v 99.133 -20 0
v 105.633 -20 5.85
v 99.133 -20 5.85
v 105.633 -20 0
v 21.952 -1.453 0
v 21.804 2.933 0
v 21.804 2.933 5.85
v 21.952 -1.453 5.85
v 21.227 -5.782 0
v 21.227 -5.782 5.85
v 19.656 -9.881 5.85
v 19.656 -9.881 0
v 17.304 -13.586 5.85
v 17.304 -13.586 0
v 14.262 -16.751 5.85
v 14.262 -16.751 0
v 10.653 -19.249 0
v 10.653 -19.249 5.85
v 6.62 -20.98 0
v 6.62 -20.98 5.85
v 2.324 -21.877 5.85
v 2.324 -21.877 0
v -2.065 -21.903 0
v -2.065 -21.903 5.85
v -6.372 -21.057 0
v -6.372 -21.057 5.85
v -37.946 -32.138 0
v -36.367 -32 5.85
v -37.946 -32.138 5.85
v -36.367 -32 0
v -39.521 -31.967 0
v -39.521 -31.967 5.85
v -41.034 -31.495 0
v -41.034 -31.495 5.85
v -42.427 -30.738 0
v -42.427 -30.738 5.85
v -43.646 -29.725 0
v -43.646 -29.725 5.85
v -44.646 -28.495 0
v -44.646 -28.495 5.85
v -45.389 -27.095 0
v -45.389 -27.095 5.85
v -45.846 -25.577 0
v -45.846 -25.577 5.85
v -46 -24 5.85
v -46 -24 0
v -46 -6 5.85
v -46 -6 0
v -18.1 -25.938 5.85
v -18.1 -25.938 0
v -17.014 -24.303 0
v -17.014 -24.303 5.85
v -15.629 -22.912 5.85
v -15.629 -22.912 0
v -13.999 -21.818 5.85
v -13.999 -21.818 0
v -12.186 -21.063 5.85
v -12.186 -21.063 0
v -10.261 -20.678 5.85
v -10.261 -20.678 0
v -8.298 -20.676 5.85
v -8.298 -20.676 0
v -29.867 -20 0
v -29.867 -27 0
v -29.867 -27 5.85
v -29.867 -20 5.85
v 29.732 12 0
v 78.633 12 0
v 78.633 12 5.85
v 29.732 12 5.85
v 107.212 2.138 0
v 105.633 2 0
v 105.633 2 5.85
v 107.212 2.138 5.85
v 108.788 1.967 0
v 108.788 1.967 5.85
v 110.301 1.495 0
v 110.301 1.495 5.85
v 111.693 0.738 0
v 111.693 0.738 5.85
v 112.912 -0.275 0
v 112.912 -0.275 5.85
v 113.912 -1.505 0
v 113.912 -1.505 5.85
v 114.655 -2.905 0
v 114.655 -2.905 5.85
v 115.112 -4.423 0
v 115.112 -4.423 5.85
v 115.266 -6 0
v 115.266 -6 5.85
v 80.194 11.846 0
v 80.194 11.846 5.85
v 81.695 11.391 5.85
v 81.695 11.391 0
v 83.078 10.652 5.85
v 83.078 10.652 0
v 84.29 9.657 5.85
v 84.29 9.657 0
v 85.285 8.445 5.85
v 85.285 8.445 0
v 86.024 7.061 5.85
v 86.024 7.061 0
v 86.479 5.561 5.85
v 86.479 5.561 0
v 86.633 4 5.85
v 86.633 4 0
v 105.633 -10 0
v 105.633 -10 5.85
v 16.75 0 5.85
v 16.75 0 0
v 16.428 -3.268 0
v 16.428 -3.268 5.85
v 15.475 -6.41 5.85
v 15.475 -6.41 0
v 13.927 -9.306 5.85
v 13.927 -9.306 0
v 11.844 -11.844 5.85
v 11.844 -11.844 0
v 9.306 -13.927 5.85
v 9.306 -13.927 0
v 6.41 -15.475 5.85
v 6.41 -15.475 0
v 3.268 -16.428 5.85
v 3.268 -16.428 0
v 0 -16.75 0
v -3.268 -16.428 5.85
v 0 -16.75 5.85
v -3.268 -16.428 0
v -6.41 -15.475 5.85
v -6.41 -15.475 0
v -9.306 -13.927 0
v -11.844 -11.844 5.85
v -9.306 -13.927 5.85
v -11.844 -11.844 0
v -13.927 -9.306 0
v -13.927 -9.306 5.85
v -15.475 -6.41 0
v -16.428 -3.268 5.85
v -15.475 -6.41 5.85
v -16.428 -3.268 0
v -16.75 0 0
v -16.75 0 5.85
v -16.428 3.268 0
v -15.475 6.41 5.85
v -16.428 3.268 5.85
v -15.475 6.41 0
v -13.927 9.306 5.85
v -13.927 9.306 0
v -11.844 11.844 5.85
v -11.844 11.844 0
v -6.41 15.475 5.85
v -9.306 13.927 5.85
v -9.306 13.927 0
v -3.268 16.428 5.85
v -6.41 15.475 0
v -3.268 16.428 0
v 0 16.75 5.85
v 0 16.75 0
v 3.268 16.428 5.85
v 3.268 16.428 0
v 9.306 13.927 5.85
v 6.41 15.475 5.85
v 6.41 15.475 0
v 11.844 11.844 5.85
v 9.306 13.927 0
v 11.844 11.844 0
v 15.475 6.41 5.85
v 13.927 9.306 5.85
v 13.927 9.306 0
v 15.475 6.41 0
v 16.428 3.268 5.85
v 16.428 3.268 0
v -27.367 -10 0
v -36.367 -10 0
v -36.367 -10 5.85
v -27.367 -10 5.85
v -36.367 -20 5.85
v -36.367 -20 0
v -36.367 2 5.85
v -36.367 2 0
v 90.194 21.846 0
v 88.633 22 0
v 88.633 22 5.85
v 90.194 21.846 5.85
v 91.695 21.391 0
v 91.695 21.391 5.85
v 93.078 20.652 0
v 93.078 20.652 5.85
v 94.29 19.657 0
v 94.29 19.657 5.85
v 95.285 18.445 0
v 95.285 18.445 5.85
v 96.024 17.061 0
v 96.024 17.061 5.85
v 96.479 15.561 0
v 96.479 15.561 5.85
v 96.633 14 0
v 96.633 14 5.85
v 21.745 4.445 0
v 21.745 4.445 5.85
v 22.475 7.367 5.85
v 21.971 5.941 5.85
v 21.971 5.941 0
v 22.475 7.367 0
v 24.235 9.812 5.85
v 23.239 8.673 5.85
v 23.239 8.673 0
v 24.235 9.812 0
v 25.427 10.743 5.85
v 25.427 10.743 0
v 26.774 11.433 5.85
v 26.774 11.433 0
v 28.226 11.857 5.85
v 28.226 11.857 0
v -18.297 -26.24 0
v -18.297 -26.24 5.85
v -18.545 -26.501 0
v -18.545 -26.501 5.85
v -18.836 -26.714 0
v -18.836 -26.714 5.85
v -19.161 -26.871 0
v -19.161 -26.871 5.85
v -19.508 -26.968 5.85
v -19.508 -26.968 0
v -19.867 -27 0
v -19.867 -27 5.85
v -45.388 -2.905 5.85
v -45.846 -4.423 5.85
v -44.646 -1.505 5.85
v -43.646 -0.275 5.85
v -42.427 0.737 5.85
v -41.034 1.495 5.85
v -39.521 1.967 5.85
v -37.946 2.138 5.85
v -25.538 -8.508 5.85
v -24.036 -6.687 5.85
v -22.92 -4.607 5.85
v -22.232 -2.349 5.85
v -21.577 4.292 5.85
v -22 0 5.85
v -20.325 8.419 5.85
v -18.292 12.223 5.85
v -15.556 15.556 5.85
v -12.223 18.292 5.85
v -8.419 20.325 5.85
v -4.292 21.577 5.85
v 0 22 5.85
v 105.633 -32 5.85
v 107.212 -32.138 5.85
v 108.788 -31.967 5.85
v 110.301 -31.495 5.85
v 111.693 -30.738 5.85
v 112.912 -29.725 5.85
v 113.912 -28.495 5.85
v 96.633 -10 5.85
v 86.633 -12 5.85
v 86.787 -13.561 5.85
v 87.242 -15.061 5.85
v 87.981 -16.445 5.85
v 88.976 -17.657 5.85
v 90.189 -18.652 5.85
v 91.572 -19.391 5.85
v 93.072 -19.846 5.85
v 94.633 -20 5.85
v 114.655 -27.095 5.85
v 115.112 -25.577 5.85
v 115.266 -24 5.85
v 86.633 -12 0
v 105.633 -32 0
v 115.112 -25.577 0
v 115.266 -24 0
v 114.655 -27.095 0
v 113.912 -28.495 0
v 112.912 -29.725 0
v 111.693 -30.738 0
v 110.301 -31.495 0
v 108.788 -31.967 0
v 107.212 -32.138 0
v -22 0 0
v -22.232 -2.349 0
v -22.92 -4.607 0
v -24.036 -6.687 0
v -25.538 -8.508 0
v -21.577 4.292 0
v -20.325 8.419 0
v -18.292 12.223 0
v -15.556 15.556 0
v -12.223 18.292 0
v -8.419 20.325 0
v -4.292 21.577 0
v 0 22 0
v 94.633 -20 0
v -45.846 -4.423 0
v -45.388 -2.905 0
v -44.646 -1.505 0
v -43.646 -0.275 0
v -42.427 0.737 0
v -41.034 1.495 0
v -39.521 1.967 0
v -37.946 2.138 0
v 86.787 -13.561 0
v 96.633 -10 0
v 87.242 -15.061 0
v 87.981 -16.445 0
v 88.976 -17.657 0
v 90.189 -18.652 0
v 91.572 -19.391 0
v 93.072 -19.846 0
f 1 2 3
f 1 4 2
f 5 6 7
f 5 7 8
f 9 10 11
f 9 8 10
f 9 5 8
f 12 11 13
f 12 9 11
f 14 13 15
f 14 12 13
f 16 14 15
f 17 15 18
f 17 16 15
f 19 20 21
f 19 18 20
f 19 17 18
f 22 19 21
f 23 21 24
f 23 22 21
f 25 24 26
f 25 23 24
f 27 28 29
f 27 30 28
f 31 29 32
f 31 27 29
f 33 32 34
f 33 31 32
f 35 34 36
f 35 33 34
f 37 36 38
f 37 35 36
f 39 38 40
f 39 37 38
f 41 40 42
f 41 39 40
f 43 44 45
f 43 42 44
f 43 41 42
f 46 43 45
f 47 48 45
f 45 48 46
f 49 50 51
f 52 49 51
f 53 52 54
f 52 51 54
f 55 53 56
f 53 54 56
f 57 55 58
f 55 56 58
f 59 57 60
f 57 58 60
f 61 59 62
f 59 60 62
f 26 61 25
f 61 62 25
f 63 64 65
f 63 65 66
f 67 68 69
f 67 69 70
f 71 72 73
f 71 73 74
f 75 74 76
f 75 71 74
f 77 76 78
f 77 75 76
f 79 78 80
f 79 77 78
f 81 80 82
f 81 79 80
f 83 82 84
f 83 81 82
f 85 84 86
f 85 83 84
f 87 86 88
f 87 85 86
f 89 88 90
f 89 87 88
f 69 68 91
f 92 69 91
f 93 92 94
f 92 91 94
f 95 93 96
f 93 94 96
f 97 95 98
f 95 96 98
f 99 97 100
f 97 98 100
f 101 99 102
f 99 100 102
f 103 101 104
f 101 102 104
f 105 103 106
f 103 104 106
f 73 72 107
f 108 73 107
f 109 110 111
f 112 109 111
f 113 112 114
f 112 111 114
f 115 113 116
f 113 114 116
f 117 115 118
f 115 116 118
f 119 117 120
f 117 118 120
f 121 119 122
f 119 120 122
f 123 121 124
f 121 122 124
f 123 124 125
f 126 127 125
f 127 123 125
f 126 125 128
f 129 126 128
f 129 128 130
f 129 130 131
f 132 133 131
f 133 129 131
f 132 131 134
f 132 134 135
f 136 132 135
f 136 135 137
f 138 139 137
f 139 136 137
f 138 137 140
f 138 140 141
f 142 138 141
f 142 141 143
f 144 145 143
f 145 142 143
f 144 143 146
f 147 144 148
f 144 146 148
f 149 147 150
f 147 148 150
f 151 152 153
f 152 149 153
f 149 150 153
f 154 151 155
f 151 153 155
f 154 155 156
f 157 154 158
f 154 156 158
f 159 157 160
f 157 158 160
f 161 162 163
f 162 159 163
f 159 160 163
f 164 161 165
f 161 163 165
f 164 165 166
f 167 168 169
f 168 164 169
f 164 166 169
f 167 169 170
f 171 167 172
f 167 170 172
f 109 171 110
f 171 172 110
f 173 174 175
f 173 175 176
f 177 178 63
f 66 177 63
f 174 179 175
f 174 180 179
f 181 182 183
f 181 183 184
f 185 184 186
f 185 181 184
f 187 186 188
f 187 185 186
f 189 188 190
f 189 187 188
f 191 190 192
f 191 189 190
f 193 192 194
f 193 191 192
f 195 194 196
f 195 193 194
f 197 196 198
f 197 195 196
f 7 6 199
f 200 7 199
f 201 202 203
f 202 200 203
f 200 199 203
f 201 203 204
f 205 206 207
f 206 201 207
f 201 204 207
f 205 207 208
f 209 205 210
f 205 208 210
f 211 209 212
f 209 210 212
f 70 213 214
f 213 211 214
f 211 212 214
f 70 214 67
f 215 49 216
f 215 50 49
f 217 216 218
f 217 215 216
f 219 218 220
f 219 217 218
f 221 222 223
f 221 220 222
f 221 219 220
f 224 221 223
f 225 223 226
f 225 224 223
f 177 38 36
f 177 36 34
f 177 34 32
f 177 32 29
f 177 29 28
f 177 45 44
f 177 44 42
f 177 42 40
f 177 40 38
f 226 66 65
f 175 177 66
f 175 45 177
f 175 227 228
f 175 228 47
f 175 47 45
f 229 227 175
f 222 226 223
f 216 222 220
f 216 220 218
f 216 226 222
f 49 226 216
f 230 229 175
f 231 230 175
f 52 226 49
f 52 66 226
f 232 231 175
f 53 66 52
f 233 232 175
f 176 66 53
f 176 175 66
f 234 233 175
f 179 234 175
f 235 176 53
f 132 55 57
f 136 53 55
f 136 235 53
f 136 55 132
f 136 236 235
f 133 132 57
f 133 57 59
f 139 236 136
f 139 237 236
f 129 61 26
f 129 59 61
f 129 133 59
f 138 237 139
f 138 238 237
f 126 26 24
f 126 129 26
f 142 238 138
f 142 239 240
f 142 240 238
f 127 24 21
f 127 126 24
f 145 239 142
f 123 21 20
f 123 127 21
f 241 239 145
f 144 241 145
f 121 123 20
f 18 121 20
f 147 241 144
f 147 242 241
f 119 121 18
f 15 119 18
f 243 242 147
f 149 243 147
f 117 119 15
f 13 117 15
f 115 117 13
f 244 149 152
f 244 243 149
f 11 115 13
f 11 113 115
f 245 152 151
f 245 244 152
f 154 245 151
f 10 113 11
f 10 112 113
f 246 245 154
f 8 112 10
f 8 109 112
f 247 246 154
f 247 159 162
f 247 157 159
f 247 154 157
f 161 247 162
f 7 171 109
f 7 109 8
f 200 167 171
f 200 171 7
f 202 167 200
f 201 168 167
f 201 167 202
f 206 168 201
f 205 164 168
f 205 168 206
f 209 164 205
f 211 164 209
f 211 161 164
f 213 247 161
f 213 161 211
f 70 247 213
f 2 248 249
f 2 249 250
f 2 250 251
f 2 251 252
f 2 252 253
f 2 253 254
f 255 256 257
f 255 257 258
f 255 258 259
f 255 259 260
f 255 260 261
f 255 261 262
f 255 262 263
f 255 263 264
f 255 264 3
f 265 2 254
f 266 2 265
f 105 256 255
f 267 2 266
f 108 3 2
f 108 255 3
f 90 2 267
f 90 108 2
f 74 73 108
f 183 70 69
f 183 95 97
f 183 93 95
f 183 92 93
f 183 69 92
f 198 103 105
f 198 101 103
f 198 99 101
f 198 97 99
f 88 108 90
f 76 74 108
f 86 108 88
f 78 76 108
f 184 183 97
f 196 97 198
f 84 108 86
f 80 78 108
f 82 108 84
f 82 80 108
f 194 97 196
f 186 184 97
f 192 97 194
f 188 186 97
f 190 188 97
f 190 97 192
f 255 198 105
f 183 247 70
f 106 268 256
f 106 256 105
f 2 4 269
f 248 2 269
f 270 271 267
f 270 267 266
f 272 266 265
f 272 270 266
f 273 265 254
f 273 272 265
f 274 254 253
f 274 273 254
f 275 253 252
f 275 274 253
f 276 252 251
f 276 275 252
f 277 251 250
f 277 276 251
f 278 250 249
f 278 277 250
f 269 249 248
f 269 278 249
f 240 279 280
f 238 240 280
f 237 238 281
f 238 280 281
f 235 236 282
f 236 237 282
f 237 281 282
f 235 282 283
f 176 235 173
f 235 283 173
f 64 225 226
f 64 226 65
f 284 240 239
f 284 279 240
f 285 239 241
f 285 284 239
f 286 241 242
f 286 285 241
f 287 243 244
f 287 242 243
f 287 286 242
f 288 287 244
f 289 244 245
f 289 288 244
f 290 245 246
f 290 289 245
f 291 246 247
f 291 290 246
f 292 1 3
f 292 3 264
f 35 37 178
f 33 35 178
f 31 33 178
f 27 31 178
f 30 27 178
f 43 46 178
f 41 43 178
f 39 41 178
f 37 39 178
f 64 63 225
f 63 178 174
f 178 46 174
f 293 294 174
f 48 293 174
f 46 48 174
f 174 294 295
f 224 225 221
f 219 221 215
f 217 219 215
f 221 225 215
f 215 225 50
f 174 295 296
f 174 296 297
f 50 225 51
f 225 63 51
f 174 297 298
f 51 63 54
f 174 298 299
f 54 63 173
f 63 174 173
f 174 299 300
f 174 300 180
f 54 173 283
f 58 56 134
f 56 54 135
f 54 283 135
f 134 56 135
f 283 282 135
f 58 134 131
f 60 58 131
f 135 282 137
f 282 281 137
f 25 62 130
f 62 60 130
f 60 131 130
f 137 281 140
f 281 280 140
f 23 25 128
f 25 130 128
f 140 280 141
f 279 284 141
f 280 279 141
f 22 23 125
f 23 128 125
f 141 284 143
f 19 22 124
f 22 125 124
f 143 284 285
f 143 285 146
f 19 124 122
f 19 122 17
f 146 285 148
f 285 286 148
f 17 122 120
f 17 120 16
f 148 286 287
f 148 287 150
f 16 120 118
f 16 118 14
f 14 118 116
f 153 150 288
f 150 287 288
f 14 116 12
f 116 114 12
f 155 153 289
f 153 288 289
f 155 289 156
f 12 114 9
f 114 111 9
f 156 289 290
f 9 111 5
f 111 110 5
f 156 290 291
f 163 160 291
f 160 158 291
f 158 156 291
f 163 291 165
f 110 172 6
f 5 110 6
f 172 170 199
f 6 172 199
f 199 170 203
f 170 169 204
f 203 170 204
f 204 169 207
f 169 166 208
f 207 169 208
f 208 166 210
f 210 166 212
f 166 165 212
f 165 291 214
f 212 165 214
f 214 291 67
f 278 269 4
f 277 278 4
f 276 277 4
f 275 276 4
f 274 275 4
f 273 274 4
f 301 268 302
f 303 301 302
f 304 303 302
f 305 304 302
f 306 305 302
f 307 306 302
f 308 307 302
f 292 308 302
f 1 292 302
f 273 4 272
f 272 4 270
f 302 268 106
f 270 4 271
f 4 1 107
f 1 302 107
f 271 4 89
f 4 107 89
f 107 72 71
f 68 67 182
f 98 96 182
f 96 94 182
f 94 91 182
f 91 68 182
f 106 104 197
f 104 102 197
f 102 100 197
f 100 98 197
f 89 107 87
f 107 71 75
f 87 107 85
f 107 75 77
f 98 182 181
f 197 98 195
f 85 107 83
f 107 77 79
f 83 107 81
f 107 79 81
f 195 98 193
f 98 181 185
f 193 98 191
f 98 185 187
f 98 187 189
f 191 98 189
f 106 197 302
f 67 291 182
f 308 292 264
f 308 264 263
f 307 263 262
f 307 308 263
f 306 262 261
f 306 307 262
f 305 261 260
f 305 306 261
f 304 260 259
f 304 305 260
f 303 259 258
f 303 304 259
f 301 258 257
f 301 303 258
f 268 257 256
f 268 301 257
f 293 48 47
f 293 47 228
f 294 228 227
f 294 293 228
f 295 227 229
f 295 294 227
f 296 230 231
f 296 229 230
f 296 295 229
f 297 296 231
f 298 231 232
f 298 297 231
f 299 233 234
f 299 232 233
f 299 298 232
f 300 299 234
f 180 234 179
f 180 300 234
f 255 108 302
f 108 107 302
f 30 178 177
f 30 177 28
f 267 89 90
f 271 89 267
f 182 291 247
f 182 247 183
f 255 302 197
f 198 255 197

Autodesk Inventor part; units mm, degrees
ref_plane "YZ Plane" through (0, 0, 0) normal (1, 0, 0) x (0, 1, 0)
ref_plane "XZ Plane" through (0, 0, 0) normal (0, 1, 0) x (-1, 0, 0)
ref_plane "XY Plane" through (0, 0, 0) normal (0, 0, 1) x (1, 0, 0)
sketch "Sketch1" plane through (0, 0, 0) normal (0, 0, 1) x (1, 0, 0)
  circle A0 centre (0, 0) radius 16.75
  line L0 (0, 0) -> (-17.65, 0) construction
  line L1 (-15.7399, -5.7288) -> (0, 0) construction
  line L2 (-14.2048, -8.8761) -> (0, 0) construction
  line L3 (-46, -6) -> (-46, -24)
  line L4 (-36.3668, 2) -> (-36.3668, -10)
  line L5 (-36.3668, -10) -> (-27.3668, -10)
  line L6 (-36.3668, -20) -> (-29.8668, -20)
  line L7 (-36.3668, -20) -> (-36.3668, -32)
  line L8 (-17.5898, -16) -> (-17.5898, -16)
  arc A1 (-27.3668, -10) -> (-22, 0) centre (-34, 0) ccw
  line L9 (34.6332, -10.9067) -> (34.6332, 21.7526) construction
  line L10 (115.2665, -6) -> (115.2665, -24)
  arc A2 (105.6332, -32) -> (115.2665, -24) centre (107.128, -24) ccw
  line L11 (105.6332, 2) -> (105.6332, -10)
  line L12 (105.6332, -10) -> (96.6332, -10)
  line L13 (105.6332, -20) -> (99.1332, -20)
  line L14 (105.6332, -20) -> (105.6332, -32)
  line L15 (96.6332, -10) -> (96.6332, 14)
  line L16 (0, 22) -> (88.6332, 22)
  line L17 (99.1332, -20) -> (94.6332, -20)
  line L18 (86.6332, -12) -> (86.6332, 4)
  line L19 (78.6332, 12) -> (29.7321, 12)
  arc A3 (96.6332, 14) -> (88.6332, 22) centre (88.6332, 14) ccw
  arc A4 (86.6332, 4) -> (78.6332, 12) centre (78.6332, 4) ccw
  arc A5 (86.6332, -12) -> (94.6332, -20) centre (94.6332, -12) ccw
  arc A6 (-6.3721, -21.057) -> (21.8036, 2.9333) centre (0, 0) ccw
  arc A7 (0, 22) -> (-22, 0) centre (0, 0) ccw
  arc A8 (29.7321, 12) -> (21.8036, 2.9333) centre (29.7321, 4) ccw
  line L20 (-19.8668, -27) -> (-29.8668, -27)
  line L21 (-29.8668, -27) -> (-29.8668, -20)
  line L22 (-46, -15) -> (-35.8797, -15) construction
  arc A9 (-6.3721, -21.057) -> (-18.1004, -25.9381) centre (-9.2685, -30.6283) ccw
  arc A10 (-19.8668, -27) -> (-18.1004, -25.9381) centre (-19.8668, -25) ccw
  arc A11 (-46, -24) -> (-36.3668, -32) centre (-37.8615, -24) ccw
  arc A12 (-36.3668, 2) -> (-46, -6) centre (-37.8615, -6) ccw
  arc A13 (115.2665, -6) -> (105.6332, 2) centre (107.128, -6) ccw
  point P0 (18.4391, 12)
  point P1 (-18.5871, -27)
  dimension "d12" = 16.75
  dimension "d19" = 160
  dimension "d30" = 9
  dimension "d40" = 46
  dimension "d43" = 8
  dimension "d44" = 22
  dimension "d45" = 8
  dimension "d46" = 10
  dimension "d47" = 10
  dimension "d48" = 142
  dimension "d59" = 6.5
  dimension "d61" = 10
  dimension "d63" = 12
  dimension "d65" = 10
  dimension "d66" = 2
  dimension "d67" = 10
  dimension "d68" = 10
  dimension "d69" = 7
  dimension "d70" = 5
  dimension "d71" = 12
  dimension "d72" = 18
extrude "Extrusion1" add sketch "Sketch1" along normal blind 5.85
properties part number "waterbottle_holder"
